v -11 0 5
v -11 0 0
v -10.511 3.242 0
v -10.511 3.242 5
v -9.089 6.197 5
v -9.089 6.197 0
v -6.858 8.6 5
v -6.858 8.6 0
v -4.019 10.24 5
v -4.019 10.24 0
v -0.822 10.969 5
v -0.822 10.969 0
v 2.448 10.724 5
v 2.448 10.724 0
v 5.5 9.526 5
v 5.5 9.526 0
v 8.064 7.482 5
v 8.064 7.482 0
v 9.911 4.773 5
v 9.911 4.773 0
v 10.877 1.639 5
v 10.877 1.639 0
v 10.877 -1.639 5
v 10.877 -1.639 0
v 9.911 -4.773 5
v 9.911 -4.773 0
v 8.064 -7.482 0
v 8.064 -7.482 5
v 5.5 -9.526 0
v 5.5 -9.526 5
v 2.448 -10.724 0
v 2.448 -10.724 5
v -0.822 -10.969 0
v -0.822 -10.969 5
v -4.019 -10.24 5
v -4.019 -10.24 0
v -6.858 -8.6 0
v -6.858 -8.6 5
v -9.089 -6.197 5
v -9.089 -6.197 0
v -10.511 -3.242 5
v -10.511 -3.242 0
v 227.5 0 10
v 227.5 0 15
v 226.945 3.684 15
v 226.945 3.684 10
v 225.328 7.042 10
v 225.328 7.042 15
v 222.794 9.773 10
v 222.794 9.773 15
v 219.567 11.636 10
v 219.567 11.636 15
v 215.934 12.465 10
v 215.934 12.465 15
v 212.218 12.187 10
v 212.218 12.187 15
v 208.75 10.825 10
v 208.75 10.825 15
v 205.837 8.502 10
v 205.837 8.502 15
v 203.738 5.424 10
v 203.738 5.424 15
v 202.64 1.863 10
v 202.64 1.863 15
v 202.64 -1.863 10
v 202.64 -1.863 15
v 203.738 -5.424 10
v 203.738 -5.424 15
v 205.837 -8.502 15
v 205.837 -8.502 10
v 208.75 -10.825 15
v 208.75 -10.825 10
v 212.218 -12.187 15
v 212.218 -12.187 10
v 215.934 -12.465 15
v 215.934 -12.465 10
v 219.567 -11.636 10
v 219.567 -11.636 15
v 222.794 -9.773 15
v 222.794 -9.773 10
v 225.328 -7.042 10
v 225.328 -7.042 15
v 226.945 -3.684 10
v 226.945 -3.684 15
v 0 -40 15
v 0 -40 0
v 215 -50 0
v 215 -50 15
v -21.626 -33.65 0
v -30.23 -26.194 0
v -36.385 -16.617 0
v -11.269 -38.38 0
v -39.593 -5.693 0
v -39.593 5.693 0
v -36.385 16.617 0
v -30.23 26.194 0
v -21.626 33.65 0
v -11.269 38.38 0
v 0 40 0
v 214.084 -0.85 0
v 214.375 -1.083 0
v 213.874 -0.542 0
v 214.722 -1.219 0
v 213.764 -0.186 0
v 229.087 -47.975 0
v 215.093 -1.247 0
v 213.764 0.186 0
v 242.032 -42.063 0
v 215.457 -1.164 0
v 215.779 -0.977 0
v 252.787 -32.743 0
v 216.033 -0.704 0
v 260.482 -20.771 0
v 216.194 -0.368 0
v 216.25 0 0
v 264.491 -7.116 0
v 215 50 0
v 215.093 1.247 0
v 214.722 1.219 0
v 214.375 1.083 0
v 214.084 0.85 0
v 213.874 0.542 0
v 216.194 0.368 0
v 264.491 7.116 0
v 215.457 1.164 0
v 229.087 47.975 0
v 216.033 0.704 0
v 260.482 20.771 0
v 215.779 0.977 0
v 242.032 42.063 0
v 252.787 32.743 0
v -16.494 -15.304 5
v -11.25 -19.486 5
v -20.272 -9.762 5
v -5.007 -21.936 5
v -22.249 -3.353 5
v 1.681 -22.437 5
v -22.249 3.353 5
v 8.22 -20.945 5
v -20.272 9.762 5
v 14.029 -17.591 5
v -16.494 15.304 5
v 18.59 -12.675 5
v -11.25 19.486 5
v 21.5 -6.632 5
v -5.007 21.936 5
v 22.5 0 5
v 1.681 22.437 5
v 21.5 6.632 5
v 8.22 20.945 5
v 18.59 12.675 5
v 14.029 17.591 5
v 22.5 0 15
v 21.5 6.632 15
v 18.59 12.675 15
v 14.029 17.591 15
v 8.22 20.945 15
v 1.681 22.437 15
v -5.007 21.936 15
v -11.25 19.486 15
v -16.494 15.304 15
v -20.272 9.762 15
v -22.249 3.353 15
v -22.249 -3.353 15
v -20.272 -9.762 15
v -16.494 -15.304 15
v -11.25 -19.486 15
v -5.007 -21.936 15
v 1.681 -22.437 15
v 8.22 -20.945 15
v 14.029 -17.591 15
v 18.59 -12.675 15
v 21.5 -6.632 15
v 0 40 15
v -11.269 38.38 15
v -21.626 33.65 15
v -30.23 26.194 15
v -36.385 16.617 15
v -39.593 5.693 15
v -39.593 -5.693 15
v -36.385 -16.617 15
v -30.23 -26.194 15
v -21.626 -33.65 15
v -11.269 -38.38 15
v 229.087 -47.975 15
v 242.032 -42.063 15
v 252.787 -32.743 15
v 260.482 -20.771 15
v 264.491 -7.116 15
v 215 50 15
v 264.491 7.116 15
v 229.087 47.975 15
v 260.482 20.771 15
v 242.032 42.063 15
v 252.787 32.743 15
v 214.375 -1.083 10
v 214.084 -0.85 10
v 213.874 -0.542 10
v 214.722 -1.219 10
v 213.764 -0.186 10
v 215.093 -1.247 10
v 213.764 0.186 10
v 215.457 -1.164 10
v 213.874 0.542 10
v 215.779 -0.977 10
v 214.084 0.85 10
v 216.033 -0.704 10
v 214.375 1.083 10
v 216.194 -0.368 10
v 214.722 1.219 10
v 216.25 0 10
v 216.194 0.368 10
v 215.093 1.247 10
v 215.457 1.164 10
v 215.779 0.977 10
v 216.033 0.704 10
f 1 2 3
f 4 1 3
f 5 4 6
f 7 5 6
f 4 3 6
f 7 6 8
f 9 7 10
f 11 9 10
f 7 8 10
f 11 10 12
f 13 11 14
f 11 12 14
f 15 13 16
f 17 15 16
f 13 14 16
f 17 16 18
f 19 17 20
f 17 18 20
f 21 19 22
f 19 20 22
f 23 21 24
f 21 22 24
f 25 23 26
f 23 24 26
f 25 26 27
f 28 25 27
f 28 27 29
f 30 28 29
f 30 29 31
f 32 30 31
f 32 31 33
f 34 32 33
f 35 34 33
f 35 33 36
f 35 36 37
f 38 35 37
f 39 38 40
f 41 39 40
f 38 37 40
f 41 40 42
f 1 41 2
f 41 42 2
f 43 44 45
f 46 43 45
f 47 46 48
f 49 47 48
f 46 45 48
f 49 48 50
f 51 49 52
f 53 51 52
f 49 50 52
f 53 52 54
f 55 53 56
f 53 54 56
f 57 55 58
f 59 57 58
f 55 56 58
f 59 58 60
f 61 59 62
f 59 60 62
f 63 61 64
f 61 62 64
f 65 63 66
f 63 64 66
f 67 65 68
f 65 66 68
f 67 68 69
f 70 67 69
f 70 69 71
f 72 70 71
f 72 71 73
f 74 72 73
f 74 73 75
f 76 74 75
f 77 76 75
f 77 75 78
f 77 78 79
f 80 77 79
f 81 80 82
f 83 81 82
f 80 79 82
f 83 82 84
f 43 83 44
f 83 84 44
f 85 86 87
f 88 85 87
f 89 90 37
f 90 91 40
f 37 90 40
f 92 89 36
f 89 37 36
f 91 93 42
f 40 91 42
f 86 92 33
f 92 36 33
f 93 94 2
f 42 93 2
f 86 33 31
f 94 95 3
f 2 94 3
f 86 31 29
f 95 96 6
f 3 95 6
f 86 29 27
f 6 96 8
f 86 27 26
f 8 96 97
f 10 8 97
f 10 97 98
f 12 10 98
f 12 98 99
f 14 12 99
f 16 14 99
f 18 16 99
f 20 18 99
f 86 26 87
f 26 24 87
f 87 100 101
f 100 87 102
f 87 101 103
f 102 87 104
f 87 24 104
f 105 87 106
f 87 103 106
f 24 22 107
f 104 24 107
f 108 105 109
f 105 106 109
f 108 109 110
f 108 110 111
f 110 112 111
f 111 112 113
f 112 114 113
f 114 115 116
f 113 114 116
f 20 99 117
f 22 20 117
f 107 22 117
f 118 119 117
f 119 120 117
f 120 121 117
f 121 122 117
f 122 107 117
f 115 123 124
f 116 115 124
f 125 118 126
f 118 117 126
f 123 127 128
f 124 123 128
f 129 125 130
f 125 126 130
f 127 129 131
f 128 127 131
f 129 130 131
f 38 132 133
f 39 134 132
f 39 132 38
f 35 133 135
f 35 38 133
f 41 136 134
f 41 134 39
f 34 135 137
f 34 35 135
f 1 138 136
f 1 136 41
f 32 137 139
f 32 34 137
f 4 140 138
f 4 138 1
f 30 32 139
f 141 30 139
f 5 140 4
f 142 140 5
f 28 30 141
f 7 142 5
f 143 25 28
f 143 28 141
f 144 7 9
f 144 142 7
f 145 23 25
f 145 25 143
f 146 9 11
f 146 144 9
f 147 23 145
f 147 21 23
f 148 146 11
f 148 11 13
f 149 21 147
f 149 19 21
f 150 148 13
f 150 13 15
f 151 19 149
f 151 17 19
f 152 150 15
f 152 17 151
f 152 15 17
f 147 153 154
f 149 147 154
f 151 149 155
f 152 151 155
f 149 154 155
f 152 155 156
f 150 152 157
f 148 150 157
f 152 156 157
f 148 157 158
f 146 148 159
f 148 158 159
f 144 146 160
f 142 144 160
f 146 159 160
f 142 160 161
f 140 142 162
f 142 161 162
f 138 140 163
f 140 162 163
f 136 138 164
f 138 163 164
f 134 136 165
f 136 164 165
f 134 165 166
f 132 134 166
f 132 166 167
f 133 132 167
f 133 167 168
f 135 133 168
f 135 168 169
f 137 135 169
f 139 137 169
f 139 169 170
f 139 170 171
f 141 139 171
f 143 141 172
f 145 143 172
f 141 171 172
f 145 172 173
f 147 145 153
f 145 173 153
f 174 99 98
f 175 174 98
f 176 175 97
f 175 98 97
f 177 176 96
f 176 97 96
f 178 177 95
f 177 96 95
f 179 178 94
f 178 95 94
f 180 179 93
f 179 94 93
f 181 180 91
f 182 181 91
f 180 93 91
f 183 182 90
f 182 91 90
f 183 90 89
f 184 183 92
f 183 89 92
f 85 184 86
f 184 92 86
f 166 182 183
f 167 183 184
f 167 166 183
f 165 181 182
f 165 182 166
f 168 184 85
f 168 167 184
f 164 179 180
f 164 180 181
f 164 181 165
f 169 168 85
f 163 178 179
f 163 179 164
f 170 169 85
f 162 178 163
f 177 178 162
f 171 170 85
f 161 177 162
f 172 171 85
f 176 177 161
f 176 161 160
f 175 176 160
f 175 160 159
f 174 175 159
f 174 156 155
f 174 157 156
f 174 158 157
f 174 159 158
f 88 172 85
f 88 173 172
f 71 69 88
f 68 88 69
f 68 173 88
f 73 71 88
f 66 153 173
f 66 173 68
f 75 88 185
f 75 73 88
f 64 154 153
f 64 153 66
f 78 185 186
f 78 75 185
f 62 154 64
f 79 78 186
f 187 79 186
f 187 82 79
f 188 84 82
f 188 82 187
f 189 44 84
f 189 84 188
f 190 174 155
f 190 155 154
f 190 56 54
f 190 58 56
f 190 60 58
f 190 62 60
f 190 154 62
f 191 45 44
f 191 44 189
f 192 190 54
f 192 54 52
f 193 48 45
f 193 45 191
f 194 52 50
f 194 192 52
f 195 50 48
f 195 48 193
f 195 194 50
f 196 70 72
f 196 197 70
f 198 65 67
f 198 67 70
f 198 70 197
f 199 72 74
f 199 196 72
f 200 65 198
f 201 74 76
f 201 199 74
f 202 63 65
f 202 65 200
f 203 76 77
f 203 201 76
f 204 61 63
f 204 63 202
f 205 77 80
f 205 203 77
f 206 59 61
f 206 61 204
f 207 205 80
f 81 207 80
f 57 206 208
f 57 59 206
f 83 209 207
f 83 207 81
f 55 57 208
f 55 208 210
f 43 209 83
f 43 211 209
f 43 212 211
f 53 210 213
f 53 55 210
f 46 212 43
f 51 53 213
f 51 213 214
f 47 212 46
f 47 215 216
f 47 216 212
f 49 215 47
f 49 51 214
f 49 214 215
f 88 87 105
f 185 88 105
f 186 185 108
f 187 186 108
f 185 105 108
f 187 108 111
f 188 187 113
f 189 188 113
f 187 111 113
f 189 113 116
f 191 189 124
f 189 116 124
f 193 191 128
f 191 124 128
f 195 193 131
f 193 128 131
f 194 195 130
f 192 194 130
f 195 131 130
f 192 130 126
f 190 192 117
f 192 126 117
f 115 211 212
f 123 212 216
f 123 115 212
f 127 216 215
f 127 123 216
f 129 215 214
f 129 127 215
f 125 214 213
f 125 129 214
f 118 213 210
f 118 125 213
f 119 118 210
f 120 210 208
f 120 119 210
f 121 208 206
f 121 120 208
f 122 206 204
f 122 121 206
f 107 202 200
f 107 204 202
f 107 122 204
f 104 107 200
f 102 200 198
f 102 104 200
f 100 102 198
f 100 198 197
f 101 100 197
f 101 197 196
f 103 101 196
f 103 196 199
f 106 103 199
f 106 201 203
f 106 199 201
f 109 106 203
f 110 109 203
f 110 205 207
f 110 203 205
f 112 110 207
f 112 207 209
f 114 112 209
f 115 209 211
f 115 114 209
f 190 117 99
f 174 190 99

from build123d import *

# Parameters (mm, degrees)
CROQUIS1_R              = 1.25
SALIENTE_EXTRUIR1_DEPTH = 15
CROQUIS5_R              = 11
CORTAR_EXTRUIR1_DEPTH   = 5
CROQUIS6_R              = 12.5
CORTAR_EXTRUIR2_DEPTH   = 5
CROQUIS4_R              = 22.5
CORTAR_EXTRUIR3_DEPTH   = 10


with BuildPart() as part:
    # Croquis1 → Saliente-Extruir1 (new body)
    with BuildSketch(Plane.XY):
        with BuildLine():
            ThreePointArc((0, 40), (-40, 0), (0, -40))
            Line((0, -40), (215, -50))
            ThreePointArc((215, -50), (265, 0), (215, 50))
            Line((215, 50), (0, 40))
        make_face()
        Circle(CROQUIS1_R, mode=Mode.SUBTRACT)
        with Locations((215, 0)):
            Circle(CROQUIS1_R, mode=Mode.SUBTRACT)
    extrude(amount=SALIENTE_EXTRUIR1_DEPTH)

    # Croquis5 → Cortar-Extruir1 (cut)
    with BuildSketch(Plane(origin=(0, 0, 0), x_dir=(-1, 0, 0), z_dir=(0, 0, -1))):
        Circle(CROQUIS5_R)
    extrude(amount=-CORTAR_EXTRUIR1_DEPTH, mode=Mode.SUBTRACT)

    # Croquis6 → Cortar-Extruir2 (cut)
    with BuildSketch(Plane.XY.offset(15)):
        with Locations((215, 0)):
            Circle(CROQUIS6_R)
    extrude(amount=-CORTAR_EXTRUIR2_DEPTH, mode=Mode.SUBTRACT)

    # Croquis4 → Cortar-Extruir3 (cut)
    with BuildSketch(Plane.XY.offset(15)):
        Circle(CROQUIS4_R)
    extrude(amount=-CORTAR_EXTRUIR3_DEPTH, mode=Mode.SUBTRACT)


solid = part.part
